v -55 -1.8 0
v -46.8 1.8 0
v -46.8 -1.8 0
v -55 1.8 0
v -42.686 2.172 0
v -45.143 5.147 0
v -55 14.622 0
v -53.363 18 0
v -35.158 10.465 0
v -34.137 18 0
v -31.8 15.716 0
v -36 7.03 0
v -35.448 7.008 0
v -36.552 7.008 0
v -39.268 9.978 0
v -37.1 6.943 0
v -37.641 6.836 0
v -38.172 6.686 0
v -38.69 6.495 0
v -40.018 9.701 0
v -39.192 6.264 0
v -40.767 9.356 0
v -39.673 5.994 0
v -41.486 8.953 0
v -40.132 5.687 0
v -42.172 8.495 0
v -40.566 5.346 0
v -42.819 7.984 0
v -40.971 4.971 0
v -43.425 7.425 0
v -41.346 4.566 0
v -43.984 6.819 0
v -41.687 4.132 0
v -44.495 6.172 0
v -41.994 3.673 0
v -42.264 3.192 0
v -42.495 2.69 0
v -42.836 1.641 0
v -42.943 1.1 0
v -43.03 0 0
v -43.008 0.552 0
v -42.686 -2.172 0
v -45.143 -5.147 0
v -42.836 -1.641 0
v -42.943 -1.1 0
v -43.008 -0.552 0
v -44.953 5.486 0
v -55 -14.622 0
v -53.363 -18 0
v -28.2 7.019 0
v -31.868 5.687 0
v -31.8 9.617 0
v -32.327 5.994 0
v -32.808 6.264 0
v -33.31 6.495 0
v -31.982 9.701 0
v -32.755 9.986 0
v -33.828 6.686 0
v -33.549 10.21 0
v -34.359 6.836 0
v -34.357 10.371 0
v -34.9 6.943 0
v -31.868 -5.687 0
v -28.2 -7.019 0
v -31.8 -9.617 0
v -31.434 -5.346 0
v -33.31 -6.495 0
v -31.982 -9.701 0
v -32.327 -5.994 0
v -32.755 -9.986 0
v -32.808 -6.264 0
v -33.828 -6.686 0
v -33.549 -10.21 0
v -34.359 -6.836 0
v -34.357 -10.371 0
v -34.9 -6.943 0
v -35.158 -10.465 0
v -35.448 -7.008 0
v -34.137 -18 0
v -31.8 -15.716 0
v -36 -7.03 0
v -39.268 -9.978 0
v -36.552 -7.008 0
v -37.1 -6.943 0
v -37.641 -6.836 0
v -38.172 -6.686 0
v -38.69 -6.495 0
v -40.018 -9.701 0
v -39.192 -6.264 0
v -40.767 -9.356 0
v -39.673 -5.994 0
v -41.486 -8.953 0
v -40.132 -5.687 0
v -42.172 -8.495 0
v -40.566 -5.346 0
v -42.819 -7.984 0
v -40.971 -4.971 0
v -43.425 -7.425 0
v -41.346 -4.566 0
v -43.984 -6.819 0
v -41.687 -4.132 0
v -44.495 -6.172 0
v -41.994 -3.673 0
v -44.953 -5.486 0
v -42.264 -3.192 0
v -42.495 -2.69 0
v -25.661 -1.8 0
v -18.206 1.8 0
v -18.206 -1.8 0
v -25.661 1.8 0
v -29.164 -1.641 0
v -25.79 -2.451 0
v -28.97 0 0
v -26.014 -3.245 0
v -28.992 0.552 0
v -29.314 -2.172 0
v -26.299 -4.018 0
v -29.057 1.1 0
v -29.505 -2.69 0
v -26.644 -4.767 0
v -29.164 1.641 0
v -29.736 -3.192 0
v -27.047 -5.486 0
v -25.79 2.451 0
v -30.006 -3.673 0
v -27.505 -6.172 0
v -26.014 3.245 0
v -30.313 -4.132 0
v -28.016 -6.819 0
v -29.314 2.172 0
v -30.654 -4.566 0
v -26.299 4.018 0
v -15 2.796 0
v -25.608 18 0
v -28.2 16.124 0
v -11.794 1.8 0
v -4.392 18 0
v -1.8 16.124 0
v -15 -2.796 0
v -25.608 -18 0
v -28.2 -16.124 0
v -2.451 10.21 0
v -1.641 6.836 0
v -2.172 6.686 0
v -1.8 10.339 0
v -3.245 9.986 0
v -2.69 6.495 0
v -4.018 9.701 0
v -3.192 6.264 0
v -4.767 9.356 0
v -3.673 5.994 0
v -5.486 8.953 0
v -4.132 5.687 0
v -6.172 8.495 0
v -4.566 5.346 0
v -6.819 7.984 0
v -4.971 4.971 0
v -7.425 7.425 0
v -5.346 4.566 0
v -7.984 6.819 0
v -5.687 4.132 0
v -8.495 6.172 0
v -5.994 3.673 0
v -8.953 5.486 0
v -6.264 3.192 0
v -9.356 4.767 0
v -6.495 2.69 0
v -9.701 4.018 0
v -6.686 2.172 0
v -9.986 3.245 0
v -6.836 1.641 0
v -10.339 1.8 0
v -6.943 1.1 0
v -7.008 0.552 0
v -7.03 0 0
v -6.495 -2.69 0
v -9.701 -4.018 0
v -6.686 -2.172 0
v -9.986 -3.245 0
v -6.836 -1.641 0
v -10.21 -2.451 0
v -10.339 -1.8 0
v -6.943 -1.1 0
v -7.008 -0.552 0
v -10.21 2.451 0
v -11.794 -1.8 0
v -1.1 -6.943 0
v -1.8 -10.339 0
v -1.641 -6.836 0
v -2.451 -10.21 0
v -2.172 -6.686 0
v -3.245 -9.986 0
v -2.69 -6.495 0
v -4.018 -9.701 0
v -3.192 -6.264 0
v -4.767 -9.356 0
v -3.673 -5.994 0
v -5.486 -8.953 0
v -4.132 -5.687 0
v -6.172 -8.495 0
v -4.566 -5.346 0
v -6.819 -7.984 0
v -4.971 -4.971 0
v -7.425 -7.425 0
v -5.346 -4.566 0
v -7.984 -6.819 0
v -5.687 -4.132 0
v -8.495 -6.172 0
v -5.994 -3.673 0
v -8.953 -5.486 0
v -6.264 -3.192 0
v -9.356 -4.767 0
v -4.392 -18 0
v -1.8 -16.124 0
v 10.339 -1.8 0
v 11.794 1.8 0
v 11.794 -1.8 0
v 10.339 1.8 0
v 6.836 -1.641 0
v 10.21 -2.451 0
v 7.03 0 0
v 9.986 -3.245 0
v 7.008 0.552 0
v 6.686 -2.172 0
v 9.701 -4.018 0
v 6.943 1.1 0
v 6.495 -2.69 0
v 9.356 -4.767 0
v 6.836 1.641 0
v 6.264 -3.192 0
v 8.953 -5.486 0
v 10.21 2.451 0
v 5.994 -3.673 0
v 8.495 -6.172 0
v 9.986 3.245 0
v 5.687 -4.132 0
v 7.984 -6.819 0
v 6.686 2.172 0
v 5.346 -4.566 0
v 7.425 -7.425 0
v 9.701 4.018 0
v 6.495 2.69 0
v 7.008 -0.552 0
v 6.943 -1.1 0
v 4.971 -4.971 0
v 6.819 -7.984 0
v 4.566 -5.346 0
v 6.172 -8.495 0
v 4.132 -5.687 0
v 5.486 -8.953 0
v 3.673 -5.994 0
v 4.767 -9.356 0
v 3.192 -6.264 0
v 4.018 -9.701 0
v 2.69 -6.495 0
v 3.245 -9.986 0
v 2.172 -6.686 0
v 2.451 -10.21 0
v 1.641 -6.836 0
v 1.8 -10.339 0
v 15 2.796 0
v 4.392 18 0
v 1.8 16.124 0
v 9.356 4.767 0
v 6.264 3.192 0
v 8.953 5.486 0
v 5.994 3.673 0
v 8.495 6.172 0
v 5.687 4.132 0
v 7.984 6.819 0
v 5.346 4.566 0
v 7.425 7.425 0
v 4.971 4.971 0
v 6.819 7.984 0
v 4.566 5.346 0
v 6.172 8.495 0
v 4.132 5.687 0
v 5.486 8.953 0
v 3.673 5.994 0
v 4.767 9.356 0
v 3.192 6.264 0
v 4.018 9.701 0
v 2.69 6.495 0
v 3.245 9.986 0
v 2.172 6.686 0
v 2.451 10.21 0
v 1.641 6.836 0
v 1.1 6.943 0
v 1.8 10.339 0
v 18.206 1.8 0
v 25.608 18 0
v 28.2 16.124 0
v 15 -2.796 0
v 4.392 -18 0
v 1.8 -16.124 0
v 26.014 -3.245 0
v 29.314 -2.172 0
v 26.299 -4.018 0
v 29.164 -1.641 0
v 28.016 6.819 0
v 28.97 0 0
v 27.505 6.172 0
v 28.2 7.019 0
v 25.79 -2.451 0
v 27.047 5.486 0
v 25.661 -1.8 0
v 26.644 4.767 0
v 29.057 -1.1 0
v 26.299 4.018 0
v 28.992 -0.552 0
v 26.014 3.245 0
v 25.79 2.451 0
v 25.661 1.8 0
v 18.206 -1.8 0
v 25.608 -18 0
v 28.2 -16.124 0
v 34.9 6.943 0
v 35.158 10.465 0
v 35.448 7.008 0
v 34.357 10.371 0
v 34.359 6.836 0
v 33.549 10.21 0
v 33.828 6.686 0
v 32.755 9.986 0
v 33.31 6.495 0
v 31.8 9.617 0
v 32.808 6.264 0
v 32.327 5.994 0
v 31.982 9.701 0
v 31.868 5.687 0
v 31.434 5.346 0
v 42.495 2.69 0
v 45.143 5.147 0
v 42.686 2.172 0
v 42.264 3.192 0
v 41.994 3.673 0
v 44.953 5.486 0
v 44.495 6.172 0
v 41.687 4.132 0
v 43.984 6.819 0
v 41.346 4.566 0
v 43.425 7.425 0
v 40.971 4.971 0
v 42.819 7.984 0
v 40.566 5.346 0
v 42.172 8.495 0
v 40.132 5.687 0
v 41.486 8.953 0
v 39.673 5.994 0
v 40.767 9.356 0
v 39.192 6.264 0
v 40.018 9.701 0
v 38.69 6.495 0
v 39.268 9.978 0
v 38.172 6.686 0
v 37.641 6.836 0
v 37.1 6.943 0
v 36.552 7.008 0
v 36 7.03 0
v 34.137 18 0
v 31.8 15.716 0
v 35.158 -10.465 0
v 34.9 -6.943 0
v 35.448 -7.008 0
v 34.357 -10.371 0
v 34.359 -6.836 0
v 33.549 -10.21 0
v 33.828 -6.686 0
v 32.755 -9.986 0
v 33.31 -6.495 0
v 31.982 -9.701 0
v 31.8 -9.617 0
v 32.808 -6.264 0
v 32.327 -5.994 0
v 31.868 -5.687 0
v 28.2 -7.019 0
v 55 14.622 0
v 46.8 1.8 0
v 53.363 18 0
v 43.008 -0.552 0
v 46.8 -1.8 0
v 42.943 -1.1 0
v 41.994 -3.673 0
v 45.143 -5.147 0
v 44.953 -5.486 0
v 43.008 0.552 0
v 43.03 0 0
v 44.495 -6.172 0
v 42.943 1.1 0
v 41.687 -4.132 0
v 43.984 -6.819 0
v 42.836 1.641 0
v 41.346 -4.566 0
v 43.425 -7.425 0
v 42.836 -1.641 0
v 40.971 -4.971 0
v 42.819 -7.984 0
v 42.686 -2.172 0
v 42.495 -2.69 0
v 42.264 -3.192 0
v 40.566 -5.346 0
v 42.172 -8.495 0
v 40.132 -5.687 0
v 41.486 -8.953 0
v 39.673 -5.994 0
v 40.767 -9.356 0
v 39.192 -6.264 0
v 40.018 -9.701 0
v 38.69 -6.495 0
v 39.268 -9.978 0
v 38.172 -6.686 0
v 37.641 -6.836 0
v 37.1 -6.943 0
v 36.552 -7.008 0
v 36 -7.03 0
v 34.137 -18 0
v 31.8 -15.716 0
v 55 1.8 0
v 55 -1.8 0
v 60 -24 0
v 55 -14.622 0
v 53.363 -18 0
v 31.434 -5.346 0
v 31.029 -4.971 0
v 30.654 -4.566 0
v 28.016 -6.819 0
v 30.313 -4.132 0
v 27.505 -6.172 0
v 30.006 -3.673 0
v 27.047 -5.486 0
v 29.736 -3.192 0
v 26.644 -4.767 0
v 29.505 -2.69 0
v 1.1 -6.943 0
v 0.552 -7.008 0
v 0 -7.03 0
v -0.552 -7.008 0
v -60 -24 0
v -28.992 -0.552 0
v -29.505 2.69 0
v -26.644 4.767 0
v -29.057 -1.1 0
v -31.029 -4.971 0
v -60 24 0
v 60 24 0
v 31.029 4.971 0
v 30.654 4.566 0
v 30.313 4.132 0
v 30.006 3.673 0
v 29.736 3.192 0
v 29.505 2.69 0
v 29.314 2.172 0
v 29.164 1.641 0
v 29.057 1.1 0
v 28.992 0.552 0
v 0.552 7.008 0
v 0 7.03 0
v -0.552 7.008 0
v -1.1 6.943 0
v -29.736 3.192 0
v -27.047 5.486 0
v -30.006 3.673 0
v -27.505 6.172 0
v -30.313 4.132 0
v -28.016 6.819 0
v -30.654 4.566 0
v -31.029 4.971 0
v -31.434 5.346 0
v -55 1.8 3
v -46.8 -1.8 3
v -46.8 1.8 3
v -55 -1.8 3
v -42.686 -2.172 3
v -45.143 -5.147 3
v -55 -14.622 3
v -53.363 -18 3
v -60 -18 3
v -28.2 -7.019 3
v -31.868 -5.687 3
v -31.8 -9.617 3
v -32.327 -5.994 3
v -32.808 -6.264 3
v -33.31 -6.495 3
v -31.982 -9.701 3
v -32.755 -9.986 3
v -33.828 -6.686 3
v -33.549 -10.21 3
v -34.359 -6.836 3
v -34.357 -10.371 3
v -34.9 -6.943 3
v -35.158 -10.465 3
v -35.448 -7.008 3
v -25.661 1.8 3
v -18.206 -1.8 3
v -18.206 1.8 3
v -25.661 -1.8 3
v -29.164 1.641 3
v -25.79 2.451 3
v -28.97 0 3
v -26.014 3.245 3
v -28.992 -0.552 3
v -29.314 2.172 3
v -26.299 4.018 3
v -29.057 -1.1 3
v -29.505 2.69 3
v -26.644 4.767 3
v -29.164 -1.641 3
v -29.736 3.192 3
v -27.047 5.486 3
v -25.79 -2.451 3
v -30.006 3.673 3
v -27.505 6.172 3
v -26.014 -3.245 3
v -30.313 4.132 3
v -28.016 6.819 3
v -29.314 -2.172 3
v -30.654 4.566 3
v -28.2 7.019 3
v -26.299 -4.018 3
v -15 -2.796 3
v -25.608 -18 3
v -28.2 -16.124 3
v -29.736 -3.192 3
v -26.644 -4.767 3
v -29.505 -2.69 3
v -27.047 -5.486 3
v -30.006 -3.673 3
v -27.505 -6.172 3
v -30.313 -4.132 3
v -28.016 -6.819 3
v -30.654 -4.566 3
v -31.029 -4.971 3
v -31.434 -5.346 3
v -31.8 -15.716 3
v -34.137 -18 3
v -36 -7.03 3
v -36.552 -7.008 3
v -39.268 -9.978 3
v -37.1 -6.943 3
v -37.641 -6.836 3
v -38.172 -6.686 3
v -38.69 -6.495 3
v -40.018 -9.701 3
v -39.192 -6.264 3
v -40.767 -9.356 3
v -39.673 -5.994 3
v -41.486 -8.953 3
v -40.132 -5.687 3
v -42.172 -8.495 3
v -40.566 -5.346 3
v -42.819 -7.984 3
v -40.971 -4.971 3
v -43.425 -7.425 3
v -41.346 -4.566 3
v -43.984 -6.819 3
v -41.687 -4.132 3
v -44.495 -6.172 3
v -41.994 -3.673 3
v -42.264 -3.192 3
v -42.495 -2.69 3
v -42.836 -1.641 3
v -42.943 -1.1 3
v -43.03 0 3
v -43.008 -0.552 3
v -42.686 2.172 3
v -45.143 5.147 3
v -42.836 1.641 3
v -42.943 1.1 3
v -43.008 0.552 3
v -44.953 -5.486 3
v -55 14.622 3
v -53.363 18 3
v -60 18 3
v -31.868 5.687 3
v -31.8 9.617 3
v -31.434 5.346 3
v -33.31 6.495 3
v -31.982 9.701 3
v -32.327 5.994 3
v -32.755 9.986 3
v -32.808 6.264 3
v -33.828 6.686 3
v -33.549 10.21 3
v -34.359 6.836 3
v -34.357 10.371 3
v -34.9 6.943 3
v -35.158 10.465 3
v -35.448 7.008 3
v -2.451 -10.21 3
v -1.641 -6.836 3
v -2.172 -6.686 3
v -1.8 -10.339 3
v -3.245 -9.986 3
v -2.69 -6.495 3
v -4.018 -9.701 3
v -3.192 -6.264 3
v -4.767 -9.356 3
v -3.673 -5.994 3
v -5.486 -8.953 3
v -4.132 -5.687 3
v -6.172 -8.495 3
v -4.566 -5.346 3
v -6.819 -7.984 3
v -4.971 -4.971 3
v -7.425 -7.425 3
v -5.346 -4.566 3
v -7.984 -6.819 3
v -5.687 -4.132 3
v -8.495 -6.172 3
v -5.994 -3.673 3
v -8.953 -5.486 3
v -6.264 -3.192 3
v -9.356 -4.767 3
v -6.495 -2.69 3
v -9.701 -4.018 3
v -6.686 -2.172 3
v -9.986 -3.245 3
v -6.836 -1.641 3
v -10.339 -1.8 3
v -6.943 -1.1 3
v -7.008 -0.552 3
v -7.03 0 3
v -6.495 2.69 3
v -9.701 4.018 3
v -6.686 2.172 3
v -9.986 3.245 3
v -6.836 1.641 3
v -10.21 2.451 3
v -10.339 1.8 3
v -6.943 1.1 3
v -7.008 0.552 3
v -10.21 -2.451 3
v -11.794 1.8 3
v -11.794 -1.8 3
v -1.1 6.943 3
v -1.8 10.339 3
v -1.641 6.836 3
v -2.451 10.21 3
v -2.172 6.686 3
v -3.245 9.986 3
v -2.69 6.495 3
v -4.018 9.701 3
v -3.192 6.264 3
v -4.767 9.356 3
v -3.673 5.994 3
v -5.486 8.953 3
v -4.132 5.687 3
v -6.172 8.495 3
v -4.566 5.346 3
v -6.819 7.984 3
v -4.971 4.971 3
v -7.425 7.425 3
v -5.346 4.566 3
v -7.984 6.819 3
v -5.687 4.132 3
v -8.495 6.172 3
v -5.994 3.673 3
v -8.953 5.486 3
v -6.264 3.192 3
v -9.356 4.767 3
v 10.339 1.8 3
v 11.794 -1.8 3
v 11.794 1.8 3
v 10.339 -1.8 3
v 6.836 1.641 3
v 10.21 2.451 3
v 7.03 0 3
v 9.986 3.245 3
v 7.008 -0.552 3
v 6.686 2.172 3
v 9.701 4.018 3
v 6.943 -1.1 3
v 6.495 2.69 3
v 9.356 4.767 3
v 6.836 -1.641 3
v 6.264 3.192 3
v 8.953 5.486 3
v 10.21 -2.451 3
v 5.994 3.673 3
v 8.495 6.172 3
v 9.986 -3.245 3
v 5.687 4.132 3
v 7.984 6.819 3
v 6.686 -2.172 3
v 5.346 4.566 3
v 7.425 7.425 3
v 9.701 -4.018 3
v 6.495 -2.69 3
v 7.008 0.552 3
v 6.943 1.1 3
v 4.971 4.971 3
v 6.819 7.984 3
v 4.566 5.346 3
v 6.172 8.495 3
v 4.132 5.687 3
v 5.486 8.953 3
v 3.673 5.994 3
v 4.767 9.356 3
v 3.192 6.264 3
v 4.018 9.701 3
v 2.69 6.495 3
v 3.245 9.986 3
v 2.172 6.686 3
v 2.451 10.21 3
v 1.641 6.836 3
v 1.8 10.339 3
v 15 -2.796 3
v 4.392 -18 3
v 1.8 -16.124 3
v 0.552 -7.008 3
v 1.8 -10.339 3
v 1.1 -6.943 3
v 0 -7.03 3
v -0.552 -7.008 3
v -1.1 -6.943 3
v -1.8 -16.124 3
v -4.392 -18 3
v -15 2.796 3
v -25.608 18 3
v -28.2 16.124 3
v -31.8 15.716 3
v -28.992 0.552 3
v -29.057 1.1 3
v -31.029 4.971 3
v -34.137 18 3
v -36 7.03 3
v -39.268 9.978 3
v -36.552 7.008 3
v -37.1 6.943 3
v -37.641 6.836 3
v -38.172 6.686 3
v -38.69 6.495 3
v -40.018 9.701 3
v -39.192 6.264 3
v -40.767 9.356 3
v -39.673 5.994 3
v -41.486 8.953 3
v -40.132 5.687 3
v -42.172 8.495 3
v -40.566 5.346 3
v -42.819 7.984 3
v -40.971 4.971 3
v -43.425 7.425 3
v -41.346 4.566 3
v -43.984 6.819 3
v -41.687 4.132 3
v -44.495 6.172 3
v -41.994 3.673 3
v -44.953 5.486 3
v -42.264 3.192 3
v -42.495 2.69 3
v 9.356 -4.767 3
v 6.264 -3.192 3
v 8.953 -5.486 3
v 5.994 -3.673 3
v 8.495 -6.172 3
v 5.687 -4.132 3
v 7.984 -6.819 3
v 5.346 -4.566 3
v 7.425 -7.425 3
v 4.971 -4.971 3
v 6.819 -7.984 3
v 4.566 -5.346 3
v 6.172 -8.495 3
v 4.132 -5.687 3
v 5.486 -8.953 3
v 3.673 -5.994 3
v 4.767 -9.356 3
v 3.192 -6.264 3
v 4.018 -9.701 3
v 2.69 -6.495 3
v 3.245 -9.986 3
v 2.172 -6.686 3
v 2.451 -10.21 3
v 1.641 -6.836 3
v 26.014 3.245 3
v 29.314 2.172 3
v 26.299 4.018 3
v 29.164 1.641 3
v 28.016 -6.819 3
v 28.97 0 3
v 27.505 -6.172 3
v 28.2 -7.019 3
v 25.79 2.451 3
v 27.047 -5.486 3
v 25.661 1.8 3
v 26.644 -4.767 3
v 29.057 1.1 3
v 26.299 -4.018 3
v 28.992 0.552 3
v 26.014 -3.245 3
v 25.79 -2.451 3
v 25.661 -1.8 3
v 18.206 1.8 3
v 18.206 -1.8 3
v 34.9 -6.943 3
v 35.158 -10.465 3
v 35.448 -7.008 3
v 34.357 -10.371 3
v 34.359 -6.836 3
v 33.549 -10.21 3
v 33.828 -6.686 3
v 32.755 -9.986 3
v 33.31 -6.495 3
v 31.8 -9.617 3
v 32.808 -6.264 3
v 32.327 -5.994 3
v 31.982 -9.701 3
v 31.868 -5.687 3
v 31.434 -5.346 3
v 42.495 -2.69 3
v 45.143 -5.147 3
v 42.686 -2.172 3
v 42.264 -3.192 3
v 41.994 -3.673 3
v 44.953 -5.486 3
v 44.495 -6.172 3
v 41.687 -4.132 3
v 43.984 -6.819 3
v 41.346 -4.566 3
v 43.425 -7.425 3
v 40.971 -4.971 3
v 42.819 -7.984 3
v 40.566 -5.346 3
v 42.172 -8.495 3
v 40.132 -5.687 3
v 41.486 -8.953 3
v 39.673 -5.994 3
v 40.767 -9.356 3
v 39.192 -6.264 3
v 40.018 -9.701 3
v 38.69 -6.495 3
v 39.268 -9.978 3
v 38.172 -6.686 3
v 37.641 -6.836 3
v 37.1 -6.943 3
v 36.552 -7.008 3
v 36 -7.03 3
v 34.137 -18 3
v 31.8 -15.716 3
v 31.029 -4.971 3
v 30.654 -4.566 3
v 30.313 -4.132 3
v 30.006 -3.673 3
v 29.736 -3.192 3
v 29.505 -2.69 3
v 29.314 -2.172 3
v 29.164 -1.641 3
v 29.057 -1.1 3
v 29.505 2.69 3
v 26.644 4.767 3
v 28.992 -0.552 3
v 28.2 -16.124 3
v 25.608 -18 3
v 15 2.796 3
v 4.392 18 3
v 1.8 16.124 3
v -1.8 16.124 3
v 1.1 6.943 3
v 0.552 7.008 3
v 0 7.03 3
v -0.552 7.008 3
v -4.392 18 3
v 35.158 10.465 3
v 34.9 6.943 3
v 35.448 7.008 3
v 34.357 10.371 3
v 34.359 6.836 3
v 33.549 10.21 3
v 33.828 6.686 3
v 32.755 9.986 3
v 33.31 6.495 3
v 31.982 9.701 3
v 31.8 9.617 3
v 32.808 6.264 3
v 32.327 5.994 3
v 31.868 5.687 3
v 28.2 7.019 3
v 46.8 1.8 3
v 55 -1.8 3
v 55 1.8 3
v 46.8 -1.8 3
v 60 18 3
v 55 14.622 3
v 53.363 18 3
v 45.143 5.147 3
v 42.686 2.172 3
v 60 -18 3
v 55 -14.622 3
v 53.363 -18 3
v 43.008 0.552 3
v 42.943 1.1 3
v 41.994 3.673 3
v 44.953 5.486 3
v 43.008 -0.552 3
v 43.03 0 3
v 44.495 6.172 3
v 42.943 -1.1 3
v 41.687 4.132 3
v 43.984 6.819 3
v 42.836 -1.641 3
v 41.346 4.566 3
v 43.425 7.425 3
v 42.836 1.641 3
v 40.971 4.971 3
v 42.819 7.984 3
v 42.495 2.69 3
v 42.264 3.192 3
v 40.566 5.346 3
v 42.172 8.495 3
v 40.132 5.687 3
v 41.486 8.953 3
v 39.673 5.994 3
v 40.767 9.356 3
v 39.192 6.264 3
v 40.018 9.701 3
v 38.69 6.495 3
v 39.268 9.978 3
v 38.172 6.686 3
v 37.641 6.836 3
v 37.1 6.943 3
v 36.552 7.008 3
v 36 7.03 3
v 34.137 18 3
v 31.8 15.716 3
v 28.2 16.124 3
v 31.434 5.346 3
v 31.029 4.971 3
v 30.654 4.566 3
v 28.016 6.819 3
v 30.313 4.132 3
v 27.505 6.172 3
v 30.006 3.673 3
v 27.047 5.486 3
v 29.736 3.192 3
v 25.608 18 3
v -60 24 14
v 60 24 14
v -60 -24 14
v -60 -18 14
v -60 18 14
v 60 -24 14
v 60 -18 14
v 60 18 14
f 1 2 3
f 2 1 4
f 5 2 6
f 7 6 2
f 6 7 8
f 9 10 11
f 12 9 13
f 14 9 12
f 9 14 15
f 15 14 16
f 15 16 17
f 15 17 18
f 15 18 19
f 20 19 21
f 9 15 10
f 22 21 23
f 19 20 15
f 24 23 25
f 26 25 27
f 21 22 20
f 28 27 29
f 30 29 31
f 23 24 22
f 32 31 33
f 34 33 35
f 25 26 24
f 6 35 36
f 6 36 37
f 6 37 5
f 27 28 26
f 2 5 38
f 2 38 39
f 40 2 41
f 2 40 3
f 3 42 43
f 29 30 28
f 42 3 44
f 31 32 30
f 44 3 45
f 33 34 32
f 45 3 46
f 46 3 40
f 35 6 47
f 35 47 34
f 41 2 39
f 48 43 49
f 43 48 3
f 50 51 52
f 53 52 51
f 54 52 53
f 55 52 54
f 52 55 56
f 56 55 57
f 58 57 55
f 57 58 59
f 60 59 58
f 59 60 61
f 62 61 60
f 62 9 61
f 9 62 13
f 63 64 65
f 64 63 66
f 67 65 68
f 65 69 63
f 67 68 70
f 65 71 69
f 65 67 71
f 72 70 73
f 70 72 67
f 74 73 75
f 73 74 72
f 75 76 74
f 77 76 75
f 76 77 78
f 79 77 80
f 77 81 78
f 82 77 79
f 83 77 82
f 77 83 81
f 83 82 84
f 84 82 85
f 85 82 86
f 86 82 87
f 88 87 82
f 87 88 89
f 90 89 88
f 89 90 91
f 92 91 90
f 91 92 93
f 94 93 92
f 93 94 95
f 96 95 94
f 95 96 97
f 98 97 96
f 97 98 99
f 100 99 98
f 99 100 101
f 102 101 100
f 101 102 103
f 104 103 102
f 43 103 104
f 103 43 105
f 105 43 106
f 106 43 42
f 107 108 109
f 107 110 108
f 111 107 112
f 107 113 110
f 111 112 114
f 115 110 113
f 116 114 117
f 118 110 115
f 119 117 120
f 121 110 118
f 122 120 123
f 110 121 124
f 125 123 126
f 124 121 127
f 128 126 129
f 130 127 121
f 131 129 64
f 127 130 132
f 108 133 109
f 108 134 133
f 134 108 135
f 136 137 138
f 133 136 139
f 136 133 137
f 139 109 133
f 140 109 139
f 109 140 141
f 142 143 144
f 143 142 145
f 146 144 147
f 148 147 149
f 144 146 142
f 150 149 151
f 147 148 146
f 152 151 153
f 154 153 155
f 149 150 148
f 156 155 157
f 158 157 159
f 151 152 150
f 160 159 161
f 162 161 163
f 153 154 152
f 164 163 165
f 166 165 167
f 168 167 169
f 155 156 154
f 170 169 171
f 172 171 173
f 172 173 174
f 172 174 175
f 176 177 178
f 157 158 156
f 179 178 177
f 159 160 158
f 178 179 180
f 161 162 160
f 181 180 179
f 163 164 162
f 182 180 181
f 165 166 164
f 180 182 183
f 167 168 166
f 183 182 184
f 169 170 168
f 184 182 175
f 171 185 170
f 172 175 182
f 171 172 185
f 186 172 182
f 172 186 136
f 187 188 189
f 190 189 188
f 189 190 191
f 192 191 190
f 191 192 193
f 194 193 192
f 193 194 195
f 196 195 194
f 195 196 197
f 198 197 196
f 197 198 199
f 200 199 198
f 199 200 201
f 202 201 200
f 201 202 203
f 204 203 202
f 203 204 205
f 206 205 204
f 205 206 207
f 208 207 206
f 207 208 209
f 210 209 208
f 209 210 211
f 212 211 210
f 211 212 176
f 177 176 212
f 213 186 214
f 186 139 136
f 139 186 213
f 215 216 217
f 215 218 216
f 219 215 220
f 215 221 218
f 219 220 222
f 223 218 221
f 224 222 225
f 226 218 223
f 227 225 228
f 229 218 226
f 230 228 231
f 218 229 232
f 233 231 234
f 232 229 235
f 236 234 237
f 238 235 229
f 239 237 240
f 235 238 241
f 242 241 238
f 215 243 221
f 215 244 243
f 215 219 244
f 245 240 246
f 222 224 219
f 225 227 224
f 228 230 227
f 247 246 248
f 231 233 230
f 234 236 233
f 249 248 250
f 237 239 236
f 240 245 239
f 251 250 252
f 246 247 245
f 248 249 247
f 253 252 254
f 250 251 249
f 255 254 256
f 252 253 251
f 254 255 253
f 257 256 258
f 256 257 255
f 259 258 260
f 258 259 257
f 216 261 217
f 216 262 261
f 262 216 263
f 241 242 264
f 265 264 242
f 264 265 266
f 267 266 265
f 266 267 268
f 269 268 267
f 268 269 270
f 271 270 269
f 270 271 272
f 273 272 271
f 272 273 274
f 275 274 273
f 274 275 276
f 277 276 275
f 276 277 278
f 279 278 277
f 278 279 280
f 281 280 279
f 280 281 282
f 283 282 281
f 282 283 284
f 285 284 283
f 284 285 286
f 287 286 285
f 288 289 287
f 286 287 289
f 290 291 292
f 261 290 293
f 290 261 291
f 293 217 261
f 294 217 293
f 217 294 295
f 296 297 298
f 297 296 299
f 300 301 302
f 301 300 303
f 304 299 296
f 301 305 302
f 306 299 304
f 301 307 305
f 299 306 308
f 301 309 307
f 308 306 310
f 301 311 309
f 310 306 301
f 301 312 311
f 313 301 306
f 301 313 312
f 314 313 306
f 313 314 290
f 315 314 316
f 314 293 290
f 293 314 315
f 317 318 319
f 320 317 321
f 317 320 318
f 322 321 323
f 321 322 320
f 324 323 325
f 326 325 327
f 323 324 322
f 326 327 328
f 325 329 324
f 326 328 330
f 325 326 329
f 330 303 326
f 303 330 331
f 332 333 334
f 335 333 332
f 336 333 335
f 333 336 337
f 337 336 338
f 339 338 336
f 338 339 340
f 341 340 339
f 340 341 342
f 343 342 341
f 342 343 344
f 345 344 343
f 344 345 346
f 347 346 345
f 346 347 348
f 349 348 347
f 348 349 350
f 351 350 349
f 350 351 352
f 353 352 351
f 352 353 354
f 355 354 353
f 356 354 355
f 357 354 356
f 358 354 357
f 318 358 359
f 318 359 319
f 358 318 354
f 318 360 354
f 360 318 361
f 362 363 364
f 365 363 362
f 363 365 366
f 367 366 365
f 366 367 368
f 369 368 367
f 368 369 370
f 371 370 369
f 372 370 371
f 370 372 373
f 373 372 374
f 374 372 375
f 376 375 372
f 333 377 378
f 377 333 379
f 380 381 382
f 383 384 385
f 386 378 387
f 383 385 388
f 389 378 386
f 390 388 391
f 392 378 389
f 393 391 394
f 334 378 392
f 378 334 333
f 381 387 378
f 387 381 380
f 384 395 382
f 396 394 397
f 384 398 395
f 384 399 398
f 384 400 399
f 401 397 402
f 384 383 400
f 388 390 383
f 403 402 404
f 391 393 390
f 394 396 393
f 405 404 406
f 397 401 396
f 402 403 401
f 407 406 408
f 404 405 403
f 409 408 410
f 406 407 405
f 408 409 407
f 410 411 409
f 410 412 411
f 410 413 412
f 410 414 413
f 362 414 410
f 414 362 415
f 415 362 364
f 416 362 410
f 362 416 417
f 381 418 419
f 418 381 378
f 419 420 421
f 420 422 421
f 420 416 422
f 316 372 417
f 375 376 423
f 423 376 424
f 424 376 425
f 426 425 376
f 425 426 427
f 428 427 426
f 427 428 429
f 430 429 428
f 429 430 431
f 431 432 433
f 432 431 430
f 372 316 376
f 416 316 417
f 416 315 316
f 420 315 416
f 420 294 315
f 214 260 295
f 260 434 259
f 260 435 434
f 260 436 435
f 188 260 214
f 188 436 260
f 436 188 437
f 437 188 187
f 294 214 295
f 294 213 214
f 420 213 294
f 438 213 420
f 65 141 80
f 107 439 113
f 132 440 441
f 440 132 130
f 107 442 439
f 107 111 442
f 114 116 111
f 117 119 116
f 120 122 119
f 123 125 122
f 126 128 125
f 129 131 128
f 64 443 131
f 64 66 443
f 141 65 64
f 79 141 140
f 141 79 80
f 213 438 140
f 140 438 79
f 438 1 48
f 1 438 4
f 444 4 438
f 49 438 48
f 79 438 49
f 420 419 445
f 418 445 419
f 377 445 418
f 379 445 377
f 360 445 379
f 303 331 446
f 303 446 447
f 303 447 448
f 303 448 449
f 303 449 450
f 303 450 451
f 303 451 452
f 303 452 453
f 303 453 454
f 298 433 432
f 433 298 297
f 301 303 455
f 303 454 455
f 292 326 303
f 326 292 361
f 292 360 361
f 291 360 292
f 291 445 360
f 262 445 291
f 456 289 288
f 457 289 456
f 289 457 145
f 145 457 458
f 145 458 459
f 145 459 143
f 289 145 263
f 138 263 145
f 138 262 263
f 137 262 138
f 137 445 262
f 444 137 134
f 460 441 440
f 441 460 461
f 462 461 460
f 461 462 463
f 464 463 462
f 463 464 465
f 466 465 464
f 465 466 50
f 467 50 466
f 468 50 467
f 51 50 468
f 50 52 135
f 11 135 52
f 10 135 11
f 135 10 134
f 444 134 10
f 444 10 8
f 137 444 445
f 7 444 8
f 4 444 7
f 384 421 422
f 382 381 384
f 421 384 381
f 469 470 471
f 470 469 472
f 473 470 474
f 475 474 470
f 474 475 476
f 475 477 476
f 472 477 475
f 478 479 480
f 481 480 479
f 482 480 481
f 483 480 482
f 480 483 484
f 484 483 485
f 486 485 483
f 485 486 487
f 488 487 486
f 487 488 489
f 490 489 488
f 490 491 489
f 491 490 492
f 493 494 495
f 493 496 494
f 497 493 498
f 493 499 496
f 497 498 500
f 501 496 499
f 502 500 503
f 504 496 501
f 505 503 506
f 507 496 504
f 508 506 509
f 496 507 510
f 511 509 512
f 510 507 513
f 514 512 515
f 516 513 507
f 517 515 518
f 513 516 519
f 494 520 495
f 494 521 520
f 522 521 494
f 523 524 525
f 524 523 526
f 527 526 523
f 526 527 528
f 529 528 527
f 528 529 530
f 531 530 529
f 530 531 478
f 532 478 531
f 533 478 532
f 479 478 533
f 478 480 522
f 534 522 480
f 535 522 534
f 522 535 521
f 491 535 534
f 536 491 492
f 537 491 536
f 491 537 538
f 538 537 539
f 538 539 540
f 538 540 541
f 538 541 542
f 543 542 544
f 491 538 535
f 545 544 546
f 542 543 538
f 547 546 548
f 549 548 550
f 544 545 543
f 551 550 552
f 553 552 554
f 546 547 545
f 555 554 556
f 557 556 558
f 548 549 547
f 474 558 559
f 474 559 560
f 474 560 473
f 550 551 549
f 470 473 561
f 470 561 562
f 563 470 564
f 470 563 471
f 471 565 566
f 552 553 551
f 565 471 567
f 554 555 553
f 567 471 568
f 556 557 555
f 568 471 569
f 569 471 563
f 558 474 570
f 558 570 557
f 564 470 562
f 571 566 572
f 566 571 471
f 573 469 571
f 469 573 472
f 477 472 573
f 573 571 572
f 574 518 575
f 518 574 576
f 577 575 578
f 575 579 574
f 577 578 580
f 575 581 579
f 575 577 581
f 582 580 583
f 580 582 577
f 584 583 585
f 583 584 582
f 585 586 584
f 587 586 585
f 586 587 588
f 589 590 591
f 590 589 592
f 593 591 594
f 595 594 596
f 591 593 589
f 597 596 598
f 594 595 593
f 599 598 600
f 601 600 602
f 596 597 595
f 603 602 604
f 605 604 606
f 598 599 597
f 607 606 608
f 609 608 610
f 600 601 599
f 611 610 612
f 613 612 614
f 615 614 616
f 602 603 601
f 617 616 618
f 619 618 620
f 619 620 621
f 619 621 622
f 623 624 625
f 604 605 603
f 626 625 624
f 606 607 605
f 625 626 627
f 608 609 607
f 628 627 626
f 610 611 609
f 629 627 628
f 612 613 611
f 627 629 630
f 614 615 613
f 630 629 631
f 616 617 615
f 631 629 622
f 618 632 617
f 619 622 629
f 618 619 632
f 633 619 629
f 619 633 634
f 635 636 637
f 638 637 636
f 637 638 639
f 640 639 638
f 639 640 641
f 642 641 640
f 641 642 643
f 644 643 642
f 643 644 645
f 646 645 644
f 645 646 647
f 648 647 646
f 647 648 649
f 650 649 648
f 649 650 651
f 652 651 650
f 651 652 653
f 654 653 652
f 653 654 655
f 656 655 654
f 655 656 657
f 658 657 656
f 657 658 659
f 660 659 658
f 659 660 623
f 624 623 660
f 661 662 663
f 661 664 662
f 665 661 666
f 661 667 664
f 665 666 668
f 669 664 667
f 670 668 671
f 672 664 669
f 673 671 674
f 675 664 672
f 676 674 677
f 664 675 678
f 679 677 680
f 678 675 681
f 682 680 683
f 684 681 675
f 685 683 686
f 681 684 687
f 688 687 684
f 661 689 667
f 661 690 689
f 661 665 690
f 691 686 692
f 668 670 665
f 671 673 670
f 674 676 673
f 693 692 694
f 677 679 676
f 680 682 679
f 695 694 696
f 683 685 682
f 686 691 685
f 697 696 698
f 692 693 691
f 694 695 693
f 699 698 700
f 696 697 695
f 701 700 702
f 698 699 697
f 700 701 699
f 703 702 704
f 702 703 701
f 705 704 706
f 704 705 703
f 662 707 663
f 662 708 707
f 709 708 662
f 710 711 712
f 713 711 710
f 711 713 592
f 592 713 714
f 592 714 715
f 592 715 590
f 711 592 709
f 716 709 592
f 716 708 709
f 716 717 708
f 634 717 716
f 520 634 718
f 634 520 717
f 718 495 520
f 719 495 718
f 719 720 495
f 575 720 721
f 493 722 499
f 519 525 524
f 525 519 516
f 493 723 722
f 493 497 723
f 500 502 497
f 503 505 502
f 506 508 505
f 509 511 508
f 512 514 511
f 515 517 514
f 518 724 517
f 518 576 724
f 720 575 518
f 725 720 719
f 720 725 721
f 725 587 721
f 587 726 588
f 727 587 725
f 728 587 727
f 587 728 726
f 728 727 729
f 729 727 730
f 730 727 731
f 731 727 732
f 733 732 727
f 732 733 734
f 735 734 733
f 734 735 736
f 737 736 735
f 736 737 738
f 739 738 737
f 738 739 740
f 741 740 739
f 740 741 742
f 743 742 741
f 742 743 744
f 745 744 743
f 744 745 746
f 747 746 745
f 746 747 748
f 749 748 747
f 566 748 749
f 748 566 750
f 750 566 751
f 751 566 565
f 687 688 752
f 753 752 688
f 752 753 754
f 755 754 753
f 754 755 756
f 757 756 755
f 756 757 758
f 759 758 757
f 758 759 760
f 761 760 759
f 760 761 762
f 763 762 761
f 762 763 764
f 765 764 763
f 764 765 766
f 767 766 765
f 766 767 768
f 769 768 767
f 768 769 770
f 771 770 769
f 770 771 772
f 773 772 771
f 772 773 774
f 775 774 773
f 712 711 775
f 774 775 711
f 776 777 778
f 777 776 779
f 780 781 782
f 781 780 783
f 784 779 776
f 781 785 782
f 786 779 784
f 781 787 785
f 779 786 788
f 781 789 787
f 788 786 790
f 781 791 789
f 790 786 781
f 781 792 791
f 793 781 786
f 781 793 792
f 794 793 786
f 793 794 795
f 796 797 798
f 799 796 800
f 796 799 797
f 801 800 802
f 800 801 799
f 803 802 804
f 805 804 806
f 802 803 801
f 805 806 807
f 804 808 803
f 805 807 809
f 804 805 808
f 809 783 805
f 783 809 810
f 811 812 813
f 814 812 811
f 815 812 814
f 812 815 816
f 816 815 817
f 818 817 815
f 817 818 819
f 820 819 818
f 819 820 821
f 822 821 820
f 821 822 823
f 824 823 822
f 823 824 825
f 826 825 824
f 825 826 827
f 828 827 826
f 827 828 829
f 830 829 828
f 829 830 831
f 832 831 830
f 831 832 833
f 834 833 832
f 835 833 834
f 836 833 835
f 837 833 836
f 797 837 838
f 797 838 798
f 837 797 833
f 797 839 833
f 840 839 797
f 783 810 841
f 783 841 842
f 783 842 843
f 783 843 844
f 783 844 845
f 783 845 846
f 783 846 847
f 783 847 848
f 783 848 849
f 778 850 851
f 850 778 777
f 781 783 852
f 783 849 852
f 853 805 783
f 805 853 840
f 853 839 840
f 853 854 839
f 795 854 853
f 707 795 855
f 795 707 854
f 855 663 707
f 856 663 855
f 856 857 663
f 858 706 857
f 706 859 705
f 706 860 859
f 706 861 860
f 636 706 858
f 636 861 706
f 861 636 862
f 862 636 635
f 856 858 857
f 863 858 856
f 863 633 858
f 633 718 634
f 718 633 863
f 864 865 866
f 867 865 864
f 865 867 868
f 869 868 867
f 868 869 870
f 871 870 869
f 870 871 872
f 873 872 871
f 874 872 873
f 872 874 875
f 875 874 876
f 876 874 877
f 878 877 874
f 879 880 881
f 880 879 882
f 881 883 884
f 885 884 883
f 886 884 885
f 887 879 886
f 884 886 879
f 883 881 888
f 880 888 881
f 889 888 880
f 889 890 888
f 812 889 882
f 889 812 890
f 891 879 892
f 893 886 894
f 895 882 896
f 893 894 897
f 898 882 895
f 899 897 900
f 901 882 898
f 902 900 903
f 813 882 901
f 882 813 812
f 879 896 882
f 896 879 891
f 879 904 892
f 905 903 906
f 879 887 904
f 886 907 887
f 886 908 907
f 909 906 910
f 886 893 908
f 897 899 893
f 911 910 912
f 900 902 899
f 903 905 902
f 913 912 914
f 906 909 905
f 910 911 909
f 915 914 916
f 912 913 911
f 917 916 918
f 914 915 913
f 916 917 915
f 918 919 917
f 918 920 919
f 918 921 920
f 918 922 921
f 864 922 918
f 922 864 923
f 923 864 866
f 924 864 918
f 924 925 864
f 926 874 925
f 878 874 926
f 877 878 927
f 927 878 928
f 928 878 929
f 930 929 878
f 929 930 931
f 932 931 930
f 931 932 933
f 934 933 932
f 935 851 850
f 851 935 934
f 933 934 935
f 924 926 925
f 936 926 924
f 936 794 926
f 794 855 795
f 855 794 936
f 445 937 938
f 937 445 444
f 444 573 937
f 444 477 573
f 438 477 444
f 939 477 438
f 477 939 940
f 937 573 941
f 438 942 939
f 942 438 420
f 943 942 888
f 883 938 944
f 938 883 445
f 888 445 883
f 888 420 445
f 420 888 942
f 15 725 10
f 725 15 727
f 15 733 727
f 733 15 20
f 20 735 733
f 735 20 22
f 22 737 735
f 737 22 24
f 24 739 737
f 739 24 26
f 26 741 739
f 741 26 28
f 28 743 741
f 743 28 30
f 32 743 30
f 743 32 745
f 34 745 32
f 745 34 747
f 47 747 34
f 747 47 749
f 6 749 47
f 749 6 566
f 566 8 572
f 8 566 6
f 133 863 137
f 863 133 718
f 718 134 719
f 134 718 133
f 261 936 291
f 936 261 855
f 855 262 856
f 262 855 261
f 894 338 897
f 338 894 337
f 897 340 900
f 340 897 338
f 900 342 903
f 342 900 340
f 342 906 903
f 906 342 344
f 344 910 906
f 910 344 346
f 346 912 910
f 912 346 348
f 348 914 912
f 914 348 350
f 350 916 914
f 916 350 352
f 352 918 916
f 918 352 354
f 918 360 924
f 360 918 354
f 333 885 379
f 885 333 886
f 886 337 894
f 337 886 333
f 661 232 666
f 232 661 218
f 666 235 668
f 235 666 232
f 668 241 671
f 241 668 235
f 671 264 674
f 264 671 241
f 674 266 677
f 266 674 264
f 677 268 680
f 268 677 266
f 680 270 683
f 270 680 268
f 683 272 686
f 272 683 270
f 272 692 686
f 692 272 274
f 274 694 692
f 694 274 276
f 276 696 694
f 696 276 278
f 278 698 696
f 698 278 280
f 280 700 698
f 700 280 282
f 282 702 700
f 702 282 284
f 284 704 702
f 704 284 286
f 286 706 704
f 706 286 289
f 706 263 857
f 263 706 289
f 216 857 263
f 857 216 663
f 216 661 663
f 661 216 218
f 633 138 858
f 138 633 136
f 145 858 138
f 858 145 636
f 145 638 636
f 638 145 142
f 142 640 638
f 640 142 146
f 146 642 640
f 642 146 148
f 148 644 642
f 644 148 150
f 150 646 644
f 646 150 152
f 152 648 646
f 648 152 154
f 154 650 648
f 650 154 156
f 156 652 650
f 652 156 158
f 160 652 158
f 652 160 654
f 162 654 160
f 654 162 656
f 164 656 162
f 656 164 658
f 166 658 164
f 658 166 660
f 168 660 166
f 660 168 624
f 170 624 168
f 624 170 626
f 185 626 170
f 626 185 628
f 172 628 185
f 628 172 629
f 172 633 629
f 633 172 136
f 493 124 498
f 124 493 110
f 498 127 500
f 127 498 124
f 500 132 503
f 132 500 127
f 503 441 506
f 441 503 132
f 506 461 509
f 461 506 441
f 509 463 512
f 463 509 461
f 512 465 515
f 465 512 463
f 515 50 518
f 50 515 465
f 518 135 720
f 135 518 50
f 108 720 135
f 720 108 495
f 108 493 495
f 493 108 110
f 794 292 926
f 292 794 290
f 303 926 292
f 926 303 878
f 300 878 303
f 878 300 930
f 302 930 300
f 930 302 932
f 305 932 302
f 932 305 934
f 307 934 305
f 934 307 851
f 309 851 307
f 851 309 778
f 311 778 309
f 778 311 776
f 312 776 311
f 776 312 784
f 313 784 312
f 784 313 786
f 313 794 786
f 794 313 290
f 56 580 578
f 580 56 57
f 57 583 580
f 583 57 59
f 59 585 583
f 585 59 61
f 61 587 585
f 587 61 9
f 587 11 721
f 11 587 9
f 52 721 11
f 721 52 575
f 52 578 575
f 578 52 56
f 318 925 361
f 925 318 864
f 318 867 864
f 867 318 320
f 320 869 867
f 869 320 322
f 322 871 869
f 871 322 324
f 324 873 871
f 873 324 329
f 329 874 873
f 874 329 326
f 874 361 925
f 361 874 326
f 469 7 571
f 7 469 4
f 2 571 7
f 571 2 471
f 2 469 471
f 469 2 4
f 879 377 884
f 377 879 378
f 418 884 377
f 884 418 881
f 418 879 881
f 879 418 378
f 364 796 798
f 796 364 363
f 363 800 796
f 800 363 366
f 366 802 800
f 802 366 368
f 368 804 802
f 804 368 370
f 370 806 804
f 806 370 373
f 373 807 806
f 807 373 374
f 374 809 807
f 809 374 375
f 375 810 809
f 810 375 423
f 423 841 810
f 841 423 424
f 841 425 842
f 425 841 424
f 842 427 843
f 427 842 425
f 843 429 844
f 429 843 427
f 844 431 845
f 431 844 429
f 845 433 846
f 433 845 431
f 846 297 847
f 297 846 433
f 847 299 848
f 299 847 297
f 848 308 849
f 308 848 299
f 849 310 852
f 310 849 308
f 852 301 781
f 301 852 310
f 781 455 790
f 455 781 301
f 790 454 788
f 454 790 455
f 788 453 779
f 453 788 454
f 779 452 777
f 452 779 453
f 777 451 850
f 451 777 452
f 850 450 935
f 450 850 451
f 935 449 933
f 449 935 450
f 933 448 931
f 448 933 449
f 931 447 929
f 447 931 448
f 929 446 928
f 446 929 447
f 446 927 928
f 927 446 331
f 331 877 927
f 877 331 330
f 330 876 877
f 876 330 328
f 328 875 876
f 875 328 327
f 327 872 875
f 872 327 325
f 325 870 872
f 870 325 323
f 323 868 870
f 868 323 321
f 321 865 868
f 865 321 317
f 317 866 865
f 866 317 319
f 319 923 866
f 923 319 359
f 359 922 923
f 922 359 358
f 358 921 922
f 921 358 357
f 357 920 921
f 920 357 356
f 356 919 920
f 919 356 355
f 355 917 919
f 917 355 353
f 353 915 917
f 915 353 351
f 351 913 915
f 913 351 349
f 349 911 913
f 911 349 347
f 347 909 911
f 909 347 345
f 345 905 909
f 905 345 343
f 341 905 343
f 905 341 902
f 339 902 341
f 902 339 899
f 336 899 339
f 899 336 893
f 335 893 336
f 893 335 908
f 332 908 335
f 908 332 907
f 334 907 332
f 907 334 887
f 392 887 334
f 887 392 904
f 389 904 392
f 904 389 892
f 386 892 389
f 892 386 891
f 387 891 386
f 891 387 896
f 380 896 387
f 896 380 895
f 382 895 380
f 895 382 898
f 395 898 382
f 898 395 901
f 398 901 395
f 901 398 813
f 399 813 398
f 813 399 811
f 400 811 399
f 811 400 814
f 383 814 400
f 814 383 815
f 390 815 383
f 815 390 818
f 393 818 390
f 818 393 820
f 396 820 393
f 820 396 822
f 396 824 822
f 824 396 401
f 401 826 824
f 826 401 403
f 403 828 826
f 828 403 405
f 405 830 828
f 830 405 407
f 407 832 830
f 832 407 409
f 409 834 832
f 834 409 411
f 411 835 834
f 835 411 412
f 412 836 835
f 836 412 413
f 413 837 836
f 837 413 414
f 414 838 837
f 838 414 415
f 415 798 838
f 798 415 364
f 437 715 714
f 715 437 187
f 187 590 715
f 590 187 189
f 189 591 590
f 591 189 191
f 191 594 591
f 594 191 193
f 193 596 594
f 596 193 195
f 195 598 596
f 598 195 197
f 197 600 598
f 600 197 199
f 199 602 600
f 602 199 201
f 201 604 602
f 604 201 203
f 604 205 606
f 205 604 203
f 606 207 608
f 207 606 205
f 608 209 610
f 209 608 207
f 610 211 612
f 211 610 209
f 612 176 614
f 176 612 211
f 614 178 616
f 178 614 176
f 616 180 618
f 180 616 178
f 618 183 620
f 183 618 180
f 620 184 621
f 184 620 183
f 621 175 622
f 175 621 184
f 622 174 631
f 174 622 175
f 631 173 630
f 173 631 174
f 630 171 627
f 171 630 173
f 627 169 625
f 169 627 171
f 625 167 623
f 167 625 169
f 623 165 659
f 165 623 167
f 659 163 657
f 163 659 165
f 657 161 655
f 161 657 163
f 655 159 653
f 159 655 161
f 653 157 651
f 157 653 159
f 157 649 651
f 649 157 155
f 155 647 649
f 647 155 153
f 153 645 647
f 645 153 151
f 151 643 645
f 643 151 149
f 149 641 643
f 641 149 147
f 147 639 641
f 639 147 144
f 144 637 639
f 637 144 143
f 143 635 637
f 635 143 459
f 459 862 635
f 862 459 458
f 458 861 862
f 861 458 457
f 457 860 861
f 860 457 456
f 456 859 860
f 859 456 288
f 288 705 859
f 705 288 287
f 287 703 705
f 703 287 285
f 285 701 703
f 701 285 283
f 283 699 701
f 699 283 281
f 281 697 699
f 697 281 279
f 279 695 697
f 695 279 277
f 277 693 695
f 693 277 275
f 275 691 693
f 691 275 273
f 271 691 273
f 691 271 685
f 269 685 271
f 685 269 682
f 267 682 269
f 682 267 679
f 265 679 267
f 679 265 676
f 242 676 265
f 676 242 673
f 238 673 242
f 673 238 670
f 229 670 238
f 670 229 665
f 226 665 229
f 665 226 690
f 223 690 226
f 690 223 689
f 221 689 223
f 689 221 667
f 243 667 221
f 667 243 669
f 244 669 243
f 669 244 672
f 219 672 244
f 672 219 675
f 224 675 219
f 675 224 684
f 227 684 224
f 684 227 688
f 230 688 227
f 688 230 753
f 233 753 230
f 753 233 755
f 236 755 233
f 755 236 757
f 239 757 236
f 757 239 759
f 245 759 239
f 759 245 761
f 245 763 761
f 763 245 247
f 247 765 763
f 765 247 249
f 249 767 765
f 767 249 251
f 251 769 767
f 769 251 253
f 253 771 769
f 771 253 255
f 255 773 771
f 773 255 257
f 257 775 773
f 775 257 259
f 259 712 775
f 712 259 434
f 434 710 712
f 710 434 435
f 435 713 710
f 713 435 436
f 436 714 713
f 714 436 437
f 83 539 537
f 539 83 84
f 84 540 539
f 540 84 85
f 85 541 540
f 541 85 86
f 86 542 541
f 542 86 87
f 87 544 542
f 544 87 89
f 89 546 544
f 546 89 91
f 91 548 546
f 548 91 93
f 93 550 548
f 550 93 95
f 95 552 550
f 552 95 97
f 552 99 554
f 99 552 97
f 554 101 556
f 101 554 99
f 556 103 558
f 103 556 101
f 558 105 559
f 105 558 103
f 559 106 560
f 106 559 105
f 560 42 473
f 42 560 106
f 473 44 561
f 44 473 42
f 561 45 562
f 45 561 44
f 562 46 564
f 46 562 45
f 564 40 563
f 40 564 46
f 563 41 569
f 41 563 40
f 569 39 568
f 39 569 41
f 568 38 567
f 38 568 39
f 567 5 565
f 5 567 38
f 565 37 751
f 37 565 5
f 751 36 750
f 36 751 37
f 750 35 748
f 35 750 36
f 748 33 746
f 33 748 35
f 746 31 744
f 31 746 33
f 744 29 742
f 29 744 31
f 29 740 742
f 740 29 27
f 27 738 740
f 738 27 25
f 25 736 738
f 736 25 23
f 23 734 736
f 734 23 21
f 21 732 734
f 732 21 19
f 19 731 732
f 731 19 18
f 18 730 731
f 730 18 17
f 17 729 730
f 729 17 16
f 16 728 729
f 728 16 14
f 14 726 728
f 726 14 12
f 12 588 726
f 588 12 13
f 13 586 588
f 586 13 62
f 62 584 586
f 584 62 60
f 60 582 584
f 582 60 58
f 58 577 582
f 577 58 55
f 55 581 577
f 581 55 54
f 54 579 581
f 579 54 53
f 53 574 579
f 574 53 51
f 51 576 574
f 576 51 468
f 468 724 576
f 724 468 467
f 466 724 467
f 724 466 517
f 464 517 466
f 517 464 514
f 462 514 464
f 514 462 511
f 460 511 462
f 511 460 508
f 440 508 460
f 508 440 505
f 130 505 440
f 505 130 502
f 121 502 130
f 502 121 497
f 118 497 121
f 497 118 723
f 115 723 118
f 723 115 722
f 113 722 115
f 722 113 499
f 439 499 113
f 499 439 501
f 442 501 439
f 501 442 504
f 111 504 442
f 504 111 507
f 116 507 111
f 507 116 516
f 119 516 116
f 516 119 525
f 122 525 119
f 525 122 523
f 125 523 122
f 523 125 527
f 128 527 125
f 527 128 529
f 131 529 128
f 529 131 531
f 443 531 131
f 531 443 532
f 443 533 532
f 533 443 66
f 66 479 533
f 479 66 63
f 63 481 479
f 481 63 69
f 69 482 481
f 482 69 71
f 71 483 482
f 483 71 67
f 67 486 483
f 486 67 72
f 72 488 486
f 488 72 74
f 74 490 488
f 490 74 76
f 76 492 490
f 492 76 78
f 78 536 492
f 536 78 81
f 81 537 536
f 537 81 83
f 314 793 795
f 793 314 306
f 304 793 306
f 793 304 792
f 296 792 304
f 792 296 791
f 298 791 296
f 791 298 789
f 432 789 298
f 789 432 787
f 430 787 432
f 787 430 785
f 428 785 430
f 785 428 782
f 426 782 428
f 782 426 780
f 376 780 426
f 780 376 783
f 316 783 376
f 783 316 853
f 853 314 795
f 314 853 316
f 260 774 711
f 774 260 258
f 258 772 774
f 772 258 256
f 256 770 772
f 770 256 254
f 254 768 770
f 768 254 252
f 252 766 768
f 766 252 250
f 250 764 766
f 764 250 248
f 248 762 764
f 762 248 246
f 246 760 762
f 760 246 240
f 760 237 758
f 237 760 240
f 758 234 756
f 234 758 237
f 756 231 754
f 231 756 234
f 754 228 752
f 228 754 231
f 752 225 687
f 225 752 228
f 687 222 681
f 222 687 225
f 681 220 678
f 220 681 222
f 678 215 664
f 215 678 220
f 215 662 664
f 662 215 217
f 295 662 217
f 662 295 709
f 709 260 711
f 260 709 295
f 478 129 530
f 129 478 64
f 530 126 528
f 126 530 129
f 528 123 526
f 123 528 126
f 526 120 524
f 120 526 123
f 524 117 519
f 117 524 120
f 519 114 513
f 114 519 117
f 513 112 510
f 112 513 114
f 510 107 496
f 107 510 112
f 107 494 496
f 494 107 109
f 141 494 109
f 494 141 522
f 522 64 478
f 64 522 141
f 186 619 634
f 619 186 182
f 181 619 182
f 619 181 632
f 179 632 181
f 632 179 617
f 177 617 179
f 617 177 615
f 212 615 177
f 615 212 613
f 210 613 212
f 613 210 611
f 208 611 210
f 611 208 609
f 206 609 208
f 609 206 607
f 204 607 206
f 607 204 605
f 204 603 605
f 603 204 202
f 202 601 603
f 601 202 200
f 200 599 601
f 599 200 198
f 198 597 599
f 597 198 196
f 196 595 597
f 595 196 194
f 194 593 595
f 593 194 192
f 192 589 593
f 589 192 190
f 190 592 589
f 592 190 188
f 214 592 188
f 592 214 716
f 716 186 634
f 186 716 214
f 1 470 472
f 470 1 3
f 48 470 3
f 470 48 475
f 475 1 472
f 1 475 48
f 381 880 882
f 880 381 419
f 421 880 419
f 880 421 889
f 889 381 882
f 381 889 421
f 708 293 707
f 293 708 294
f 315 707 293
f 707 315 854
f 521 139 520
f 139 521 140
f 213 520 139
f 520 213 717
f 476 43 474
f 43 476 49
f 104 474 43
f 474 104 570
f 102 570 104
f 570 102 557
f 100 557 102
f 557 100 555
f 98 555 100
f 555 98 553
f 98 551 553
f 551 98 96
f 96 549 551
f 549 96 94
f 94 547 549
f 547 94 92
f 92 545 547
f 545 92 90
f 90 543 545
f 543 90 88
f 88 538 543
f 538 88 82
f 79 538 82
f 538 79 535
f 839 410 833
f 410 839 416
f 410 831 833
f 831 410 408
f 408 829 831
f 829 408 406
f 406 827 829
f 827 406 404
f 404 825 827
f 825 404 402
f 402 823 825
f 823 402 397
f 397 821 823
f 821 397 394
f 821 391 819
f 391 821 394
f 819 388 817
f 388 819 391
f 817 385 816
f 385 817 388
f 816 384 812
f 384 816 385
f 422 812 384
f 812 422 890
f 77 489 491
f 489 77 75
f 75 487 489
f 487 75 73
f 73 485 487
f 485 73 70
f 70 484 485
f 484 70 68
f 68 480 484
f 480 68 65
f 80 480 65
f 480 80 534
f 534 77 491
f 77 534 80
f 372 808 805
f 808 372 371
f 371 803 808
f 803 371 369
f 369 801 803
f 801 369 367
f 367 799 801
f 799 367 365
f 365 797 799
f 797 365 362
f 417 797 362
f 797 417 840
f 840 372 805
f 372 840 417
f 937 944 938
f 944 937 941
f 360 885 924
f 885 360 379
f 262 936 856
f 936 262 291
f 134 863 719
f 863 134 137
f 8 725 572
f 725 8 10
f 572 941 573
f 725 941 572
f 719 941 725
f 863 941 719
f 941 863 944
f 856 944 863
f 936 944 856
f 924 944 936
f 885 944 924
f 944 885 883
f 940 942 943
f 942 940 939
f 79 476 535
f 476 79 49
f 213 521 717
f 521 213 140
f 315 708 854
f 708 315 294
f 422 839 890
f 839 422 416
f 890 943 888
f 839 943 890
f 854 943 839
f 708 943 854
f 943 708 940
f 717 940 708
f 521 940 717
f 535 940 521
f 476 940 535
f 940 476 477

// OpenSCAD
// Units: mm

// Resolution
$fn = 80;

// Overall footprint
part_length = 120;
part_width = 48;

// Stepped heights
web_height = 3;
side_wall_height = 14;

// Rib widths
perimeter_rib_width = 5;
longitudinal_rib_width = 3.6;
transverse_rib_width = 3.6;
diagonal_rib_width = 3.2;

// Added long side walls
side_wall_thickness = 6;

// Circular through-openings
circular_opening_diameter = 14;
circular_ring_width = 3.5;
opening_cut_clearance = 0.06;
circular_opening_centers = [
    [-36, 0],
    [0, 0],
    [36, 0]
];

// Internal rib positions
transverse_rib_positions_x = [-30, 0, 30];

// Derived web centerlines
web_x_min = -part_length/2 + perimeter_rib_width/2;
web_x_max =  part_length/2 - perimeter_rib_width/2;
web_y_min = -part_width/2 + perimeter_rib_width/2;
web_y_max =  part_width/2 - perimeter_rib_width/2;
wall_y_offset = part_width/2 - side_wall_thickness/2;

panel_nodes_x = [
    web_x_min,
    transverse_rib_positions_x[0],
    transverse_rib_positions_x[1],
    transverse_rib_positions_x[2],
    web_x_max
];

// Rounded 2D rib between two points
module capsule_2d(p1, p2, w) {
    hull() {
        translate([p1[0], p1[1]]) circle(d=w);
        translate([p2[0], p2[1]]) circle(d=w);
    }
}

// Low outer web perimeter
module perimeter_frame_2d() {
    difference() {
        square([part_length, part_width], center=true);
        square([
            part_length - 2*perimeter_rib_width,
            part_width - 2*perimeter_rib_width
        ], center=true);
    }
}

// Solid annular pads around circular voids
module circular_opening_pads_2d() {
    for (c = circular_opening_centers) {
        translate([c[0], c[1]])
            circle(d=circular_opening_diameter + 2*circular_ring_width);
    }
}

// Through-cuts that keep circular openings void
module circular_opening_cuts_2d() {
    for (c = circular_opening_centers) {
        translate([c[0], c[1]])
            circle(d=circular_opening_diameter + opening_cut_clearance);
    }
}

// Internal cross and diagonal rib network
module rib_network_2d() {
    // Long center rib
    capsule_2d([web_x_min, 0], [web_x_max, 0], longitudinal_rib_width);

    // Transverse cross ribs
    for (x = transverse_rib_positions_x) {
        capsule_2d([x, web_y_min], [x, web_y_max], transverse_rib_width);
    }

    // Diagonal X ribs in each bay
    for (i = [0 : len(panel_nodes_x) - 2]) {
        capsule_2d(
            [panel_nodes_x[i], web_y_min],
            [panel_nodes_x[i + 1], web_y_max],
            diagonal_rib_width
        );
        capsule_2d(
            [panel_nodes_x[i], web_y_max],
            [panel_nodes_x[i + 1], web_y_min],
            diagonal_rib_width
        );
    }
}

// 2D open web plan, built from ribs only
module web_plan_2d() {
    difference() {
        union() {
            perimeter_frame_2d();
            rib_network_2d();
            circular_opening_pads_2d();
        }
        circular_opening_cuts_2d();
    }
}

// Shallow open web extrusion
module web_3d() {
    linear_extrude(height=web_height, convexity=10)
        web_plan_2d();
}

// Tall solid side wall added along each long edge
module side_wall_3d(y_sign) {
    translate([0, y_sign*wall_y_offset, side_wall_height/2])
        cube([part_length, side_wall_thickness, side_wall_height], center=true);
}

// Main part
module open_web_part() {
    union() {
        web_3d();
        side_wall_3d(1);
        side_wall_3d(-1);
    }
}

open_web_part();
